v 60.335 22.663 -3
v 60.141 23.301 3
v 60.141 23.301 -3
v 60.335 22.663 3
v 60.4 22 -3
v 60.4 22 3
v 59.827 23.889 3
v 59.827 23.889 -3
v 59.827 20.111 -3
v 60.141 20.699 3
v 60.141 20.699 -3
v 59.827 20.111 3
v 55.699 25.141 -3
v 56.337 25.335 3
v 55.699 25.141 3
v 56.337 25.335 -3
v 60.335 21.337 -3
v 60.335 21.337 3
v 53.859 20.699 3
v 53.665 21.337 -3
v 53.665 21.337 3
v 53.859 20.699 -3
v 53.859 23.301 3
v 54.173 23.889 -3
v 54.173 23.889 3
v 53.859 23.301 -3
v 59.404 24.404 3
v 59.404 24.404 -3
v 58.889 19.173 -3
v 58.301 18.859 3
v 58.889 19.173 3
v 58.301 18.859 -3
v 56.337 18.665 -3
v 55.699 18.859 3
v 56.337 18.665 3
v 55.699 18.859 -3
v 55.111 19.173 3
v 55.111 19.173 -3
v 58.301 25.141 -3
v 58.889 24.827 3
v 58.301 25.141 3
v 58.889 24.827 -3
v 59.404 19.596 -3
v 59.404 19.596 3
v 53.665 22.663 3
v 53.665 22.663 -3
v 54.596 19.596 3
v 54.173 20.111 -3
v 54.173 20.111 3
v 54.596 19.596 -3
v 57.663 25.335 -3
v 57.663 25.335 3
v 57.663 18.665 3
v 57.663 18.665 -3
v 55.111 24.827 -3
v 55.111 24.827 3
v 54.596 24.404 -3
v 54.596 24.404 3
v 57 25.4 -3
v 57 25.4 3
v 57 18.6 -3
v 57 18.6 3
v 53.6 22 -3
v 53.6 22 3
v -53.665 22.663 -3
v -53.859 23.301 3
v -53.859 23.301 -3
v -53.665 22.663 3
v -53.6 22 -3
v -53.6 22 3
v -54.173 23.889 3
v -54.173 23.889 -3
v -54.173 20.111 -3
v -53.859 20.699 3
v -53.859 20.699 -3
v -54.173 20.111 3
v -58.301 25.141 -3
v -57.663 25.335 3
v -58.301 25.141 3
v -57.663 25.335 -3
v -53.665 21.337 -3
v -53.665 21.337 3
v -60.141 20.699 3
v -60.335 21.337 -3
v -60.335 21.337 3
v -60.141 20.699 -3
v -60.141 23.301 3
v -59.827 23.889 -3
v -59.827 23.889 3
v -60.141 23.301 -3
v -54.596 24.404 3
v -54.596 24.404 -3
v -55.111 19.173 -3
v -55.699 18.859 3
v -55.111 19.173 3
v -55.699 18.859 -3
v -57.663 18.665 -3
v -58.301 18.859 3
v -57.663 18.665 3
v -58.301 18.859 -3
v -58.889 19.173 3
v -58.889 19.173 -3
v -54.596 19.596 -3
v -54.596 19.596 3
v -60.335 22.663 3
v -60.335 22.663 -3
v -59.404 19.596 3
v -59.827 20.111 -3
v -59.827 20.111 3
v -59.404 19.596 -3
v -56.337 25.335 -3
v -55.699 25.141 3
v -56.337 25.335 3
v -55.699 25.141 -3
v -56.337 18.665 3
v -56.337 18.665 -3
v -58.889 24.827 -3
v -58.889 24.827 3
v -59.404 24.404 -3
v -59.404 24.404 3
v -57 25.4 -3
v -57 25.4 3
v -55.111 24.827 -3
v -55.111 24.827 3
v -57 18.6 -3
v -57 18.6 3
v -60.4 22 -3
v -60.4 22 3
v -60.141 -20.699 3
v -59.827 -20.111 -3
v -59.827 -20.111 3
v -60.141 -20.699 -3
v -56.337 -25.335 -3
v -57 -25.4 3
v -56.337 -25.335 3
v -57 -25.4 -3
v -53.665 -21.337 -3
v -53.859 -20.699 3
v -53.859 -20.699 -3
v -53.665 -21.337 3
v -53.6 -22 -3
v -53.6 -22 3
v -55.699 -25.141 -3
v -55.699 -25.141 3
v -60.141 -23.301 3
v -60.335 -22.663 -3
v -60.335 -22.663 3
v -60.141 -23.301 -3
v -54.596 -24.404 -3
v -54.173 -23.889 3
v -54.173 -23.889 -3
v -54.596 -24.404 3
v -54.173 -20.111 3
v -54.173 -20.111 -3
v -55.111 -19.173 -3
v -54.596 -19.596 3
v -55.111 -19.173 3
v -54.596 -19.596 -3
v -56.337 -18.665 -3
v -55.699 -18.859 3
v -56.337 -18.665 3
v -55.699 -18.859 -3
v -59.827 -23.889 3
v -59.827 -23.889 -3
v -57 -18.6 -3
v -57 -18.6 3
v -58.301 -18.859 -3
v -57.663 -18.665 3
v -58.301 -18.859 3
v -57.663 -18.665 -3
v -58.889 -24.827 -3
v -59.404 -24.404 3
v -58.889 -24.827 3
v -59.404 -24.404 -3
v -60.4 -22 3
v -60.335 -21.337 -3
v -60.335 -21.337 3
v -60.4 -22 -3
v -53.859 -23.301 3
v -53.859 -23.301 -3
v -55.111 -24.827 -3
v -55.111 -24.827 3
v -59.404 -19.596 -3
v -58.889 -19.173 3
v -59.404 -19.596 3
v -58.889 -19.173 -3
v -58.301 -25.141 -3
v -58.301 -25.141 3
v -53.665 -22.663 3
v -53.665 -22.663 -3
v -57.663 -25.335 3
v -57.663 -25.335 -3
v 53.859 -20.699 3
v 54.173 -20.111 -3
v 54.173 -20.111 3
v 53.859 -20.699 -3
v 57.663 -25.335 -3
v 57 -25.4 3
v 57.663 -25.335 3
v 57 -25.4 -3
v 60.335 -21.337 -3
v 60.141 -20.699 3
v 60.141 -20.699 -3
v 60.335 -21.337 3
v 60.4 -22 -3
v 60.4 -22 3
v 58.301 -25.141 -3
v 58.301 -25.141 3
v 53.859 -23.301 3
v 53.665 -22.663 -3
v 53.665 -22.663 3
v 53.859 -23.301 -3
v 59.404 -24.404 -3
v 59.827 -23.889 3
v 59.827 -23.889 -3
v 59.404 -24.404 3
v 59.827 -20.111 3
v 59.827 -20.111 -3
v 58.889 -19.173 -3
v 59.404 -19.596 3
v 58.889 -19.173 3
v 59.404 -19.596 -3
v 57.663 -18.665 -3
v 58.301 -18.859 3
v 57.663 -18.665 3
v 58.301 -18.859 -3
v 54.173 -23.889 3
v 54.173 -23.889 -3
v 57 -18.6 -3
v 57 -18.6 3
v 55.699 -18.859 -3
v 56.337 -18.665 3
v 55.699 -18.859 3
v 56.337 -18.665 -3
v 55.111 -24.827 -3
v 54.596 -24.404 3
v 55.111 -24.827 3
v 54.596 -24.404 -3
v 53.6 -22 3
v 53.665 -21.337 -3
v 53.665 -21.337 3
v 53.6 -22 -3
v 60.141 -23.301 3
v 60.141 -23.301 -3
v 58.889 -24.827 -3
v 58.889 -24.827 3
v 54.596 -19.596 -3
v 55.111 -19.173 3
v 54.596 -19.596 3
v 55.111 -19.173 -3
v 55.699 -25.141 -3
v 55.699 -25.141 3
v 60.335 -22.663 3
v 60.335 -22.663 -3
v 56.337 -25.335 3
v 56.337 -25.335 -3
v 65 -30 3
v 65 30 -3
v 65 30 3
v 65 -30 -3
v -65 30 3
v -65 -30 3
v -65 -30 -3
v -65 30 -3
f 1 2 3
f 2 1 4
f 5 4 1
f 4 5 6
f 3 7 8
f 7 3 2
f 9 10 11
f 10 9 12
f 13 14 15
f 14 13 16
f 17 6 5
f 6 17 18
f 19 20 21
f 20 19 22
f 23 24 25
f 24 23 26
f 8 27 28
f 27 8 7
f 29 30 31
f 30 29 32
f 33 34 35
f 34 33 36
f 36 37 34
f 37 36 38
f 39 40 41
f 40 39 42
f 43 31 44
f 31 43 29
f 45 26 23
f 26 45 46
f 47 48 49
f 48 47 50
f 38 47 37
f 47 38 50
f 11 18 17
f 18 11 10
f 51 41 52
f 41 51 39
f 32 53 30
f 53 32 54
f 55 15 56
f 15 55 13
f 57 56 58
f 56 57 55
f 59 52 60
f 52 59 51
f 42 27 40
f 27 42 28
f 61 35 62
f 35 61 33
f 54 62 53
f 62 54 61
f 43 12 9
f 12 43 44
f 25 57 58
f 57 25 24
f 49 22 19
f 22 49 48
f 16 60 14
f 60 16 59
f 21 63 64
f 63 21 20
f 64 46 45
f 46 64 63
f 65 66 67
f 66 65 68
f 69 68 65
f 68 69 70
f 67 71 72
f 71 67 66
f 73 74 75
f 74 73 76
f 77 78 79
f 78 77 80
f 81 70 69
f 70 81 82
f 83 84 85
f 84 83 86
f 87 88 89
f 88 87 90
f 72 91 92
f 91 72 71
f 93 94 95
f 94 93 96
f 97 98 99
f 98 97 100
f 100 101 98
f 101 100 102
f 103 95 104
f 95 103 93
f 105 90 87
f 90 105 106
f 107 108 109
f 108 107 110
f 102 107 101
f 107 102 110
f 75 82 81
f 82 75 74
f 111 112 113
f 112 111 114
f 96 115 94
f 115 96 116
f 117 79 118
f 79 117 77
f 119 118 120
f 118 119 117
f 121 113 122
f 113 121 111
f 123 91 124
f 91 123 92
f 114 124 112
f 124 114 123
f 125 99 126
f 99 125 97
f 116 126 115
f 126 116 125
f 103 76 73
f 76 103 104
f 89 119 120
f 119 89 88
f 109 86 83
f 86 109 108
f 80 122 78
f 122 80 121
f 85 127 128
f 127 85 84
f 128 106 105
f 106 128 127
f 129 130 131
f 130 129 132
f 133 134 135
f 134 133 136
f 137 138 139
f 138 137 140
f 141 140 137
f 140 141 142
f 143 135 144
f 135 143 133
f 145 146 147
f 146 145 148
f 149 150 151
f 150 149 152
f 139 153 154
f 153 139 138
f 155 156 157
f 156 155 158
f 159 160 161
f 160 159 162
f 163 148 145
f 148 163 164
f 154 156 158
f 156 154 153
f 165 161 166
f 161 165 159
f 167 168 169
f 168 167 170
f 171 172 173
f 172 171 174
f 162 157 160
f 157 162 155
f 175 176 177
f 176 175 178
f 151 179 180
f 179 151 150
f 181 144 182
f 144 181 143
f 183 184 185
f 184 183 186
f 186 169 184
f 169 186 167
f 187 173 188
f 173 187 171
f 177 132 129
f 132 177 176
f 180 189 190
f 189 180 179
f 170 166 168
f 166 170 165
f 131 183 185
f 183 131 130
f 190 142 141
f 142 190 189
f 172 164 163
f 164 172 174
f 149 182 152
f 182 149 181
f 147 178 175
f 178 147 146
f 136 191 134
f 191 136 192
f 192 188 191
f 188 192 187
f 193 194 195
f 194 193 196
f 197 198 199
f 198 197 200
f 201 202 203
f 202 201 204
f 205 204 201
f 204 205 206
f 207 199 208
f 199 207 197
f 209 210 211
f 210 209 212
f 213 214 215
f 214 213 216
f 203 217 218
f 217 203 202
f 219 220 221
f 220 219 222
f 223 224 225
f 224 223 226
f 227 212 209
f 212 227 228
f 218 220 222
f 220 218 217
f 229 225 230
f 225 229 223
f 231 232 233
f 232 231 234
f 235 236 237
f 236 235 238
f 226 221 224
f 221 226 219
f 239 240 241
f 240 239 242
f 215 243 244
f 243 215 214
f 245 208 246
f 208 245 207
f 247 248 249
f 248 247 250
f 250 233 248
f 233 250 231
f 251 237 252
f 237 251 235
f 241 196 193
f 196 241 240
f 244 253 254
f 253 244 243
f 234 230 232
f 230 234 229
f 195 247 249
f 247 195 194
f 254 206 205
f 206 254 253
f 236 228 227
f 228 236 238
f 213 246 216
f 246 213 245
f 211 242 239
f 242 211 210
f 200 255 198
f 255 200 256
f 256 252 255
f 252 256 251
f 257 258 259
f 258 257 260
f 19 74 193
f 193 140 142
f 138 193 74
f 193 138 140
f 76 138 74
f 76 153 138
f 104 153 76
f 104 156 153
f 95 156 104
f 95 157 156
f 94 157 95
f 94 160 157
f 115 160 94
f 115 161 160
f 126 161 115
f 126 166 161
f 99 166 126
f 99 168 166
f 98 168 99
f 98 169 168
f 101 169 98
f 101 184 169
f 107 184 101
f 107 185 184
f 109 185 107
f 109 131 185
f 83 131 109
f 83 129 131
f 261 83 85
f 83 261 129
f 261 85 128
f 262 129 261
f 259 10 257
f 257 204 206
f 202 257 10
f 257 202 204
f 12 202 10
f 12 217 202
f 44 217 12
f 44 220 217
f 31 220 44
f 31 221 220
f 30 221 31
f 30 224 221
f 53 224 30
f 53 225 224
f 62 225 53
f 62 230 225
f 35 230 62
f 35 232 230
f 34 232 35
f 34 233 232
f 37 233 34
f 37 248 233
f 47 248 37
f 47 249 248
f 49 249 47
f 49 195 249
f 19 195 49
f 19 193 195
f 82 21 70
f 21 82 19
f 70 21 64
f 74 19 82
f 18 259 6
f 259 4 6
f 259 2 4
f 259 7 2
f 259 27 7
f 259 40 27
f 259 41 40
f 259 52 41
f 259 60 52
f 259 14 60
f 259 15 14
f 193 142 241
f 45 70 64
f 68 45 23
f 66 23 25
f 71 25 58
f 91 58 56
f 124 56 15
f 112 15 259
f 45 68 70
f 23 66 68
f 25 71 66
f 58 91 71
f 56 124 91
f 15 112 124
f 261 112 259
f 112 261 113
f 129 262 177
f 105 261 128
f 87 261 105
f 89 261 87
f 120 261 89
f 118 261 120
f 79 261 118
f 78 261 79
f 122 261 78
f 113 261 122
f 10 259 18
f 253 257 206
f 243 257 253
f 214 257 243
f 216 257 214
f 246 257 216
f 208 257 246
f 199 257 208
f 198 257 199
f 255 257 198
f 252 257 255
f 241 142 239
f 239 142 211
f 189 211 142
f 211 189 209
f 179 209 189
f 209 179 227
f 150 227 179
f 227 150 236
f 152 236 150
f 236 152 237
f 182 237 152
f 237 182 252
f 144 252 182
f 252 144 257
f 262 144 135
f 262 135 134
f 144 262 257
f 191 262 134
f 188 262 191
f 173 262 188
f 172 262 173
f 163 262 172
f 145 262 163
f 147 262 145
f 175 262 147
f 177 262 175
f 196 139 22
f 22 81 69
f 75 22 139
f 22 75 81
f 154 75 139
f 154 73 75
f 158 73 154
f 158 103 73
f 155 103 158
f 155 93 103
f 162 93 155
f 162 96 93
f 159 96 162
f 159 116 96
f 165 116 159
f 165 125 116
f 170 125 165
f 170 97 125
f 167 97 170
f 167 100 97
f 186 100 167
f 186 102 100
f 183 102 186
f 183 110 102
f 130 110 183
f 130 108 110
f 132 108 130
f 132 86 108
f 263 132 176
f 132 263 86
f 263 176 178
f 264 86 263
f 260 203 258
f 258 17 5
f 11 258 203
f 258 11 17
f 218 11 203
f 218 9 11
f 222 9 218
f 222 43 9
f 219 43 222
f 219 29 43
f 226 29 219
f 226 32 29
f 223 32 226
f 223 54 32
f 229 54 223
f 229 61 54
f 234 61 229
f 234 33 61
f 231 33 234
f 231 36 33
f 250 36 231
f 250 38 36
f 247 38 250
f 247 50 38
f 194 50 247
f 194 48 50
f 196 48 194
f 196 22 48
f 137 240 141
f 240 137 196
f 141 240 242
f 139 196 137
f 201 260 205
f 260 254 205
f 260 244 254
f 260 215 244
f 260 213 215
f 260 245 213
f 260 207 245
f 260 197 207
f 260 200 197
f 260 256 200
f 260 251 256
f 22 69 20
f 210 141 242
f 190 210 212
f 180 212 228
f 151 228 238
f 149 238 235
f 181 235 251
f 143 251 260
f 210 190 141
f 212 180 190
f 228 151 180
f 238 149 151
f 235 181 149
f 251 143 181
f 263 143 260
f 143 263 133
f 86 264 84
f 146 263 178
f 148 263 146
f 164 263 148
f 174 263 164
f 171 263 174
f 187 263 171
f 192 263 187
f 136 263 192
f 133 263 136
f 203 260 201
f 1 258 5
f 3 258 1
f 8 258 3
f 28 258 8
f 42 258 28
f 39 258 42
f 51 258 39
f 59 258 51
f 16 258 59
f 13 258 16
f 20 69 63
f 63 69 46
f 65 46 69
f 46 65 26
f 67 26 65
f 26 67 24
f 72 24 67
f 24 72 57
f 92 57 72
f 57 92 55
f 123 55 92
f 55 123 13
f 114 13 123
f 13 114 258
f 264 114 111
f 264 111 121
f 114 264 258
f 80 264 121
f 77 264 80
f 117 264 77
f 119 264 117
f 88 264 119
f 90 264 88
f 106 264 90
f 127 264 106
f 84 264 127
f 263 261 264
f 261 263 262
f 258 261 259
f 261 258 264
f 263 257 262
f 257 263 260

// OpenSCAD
$fn = 32;

// ----------------------------------------------------------------------
// Corner plate 130 x 60 x 6
// 4 holes, centres taken from the edge offset
// ----------------------------------------------------------------------

// --- parameters (mm) ---
plate = [130, 60, 6];   // overall size (x, y, z)
holes = 4;              // number of holes the drawing asks for
bore_d = 6.6;           // nominal hole diameter from the drawing
print_allowance = 0.2;  // clearance added for printing
edge = 8;               // hole centre offset from the plate edge

// --- derived feature positions (mm) ---
hole_d = bore_d + print_allowance;  // = 6.8   hole diameter as printed
corner_x = plate[0] / 2 - edge;     // = 57   corner hole X
corner_y = plate[1] / 2 - edge;     // = 22   corner hole Y
feature_centers = [
  [corner_x, corner_y],
  [-corner_x, corner_y],
  [-corner_x, -corner_y],
  [corner_x, -corner_y]
];   // hole centres the loop below drills

// plate outline, every hole drilled through with the same cutters
difference() {
  cube(plate, center = true);
  for (centre = feature_centers)
    translate([centre[0], centre[1], 0])
      cylinder(d = hole_d, h = plate[2] + 2, center = true);
}
